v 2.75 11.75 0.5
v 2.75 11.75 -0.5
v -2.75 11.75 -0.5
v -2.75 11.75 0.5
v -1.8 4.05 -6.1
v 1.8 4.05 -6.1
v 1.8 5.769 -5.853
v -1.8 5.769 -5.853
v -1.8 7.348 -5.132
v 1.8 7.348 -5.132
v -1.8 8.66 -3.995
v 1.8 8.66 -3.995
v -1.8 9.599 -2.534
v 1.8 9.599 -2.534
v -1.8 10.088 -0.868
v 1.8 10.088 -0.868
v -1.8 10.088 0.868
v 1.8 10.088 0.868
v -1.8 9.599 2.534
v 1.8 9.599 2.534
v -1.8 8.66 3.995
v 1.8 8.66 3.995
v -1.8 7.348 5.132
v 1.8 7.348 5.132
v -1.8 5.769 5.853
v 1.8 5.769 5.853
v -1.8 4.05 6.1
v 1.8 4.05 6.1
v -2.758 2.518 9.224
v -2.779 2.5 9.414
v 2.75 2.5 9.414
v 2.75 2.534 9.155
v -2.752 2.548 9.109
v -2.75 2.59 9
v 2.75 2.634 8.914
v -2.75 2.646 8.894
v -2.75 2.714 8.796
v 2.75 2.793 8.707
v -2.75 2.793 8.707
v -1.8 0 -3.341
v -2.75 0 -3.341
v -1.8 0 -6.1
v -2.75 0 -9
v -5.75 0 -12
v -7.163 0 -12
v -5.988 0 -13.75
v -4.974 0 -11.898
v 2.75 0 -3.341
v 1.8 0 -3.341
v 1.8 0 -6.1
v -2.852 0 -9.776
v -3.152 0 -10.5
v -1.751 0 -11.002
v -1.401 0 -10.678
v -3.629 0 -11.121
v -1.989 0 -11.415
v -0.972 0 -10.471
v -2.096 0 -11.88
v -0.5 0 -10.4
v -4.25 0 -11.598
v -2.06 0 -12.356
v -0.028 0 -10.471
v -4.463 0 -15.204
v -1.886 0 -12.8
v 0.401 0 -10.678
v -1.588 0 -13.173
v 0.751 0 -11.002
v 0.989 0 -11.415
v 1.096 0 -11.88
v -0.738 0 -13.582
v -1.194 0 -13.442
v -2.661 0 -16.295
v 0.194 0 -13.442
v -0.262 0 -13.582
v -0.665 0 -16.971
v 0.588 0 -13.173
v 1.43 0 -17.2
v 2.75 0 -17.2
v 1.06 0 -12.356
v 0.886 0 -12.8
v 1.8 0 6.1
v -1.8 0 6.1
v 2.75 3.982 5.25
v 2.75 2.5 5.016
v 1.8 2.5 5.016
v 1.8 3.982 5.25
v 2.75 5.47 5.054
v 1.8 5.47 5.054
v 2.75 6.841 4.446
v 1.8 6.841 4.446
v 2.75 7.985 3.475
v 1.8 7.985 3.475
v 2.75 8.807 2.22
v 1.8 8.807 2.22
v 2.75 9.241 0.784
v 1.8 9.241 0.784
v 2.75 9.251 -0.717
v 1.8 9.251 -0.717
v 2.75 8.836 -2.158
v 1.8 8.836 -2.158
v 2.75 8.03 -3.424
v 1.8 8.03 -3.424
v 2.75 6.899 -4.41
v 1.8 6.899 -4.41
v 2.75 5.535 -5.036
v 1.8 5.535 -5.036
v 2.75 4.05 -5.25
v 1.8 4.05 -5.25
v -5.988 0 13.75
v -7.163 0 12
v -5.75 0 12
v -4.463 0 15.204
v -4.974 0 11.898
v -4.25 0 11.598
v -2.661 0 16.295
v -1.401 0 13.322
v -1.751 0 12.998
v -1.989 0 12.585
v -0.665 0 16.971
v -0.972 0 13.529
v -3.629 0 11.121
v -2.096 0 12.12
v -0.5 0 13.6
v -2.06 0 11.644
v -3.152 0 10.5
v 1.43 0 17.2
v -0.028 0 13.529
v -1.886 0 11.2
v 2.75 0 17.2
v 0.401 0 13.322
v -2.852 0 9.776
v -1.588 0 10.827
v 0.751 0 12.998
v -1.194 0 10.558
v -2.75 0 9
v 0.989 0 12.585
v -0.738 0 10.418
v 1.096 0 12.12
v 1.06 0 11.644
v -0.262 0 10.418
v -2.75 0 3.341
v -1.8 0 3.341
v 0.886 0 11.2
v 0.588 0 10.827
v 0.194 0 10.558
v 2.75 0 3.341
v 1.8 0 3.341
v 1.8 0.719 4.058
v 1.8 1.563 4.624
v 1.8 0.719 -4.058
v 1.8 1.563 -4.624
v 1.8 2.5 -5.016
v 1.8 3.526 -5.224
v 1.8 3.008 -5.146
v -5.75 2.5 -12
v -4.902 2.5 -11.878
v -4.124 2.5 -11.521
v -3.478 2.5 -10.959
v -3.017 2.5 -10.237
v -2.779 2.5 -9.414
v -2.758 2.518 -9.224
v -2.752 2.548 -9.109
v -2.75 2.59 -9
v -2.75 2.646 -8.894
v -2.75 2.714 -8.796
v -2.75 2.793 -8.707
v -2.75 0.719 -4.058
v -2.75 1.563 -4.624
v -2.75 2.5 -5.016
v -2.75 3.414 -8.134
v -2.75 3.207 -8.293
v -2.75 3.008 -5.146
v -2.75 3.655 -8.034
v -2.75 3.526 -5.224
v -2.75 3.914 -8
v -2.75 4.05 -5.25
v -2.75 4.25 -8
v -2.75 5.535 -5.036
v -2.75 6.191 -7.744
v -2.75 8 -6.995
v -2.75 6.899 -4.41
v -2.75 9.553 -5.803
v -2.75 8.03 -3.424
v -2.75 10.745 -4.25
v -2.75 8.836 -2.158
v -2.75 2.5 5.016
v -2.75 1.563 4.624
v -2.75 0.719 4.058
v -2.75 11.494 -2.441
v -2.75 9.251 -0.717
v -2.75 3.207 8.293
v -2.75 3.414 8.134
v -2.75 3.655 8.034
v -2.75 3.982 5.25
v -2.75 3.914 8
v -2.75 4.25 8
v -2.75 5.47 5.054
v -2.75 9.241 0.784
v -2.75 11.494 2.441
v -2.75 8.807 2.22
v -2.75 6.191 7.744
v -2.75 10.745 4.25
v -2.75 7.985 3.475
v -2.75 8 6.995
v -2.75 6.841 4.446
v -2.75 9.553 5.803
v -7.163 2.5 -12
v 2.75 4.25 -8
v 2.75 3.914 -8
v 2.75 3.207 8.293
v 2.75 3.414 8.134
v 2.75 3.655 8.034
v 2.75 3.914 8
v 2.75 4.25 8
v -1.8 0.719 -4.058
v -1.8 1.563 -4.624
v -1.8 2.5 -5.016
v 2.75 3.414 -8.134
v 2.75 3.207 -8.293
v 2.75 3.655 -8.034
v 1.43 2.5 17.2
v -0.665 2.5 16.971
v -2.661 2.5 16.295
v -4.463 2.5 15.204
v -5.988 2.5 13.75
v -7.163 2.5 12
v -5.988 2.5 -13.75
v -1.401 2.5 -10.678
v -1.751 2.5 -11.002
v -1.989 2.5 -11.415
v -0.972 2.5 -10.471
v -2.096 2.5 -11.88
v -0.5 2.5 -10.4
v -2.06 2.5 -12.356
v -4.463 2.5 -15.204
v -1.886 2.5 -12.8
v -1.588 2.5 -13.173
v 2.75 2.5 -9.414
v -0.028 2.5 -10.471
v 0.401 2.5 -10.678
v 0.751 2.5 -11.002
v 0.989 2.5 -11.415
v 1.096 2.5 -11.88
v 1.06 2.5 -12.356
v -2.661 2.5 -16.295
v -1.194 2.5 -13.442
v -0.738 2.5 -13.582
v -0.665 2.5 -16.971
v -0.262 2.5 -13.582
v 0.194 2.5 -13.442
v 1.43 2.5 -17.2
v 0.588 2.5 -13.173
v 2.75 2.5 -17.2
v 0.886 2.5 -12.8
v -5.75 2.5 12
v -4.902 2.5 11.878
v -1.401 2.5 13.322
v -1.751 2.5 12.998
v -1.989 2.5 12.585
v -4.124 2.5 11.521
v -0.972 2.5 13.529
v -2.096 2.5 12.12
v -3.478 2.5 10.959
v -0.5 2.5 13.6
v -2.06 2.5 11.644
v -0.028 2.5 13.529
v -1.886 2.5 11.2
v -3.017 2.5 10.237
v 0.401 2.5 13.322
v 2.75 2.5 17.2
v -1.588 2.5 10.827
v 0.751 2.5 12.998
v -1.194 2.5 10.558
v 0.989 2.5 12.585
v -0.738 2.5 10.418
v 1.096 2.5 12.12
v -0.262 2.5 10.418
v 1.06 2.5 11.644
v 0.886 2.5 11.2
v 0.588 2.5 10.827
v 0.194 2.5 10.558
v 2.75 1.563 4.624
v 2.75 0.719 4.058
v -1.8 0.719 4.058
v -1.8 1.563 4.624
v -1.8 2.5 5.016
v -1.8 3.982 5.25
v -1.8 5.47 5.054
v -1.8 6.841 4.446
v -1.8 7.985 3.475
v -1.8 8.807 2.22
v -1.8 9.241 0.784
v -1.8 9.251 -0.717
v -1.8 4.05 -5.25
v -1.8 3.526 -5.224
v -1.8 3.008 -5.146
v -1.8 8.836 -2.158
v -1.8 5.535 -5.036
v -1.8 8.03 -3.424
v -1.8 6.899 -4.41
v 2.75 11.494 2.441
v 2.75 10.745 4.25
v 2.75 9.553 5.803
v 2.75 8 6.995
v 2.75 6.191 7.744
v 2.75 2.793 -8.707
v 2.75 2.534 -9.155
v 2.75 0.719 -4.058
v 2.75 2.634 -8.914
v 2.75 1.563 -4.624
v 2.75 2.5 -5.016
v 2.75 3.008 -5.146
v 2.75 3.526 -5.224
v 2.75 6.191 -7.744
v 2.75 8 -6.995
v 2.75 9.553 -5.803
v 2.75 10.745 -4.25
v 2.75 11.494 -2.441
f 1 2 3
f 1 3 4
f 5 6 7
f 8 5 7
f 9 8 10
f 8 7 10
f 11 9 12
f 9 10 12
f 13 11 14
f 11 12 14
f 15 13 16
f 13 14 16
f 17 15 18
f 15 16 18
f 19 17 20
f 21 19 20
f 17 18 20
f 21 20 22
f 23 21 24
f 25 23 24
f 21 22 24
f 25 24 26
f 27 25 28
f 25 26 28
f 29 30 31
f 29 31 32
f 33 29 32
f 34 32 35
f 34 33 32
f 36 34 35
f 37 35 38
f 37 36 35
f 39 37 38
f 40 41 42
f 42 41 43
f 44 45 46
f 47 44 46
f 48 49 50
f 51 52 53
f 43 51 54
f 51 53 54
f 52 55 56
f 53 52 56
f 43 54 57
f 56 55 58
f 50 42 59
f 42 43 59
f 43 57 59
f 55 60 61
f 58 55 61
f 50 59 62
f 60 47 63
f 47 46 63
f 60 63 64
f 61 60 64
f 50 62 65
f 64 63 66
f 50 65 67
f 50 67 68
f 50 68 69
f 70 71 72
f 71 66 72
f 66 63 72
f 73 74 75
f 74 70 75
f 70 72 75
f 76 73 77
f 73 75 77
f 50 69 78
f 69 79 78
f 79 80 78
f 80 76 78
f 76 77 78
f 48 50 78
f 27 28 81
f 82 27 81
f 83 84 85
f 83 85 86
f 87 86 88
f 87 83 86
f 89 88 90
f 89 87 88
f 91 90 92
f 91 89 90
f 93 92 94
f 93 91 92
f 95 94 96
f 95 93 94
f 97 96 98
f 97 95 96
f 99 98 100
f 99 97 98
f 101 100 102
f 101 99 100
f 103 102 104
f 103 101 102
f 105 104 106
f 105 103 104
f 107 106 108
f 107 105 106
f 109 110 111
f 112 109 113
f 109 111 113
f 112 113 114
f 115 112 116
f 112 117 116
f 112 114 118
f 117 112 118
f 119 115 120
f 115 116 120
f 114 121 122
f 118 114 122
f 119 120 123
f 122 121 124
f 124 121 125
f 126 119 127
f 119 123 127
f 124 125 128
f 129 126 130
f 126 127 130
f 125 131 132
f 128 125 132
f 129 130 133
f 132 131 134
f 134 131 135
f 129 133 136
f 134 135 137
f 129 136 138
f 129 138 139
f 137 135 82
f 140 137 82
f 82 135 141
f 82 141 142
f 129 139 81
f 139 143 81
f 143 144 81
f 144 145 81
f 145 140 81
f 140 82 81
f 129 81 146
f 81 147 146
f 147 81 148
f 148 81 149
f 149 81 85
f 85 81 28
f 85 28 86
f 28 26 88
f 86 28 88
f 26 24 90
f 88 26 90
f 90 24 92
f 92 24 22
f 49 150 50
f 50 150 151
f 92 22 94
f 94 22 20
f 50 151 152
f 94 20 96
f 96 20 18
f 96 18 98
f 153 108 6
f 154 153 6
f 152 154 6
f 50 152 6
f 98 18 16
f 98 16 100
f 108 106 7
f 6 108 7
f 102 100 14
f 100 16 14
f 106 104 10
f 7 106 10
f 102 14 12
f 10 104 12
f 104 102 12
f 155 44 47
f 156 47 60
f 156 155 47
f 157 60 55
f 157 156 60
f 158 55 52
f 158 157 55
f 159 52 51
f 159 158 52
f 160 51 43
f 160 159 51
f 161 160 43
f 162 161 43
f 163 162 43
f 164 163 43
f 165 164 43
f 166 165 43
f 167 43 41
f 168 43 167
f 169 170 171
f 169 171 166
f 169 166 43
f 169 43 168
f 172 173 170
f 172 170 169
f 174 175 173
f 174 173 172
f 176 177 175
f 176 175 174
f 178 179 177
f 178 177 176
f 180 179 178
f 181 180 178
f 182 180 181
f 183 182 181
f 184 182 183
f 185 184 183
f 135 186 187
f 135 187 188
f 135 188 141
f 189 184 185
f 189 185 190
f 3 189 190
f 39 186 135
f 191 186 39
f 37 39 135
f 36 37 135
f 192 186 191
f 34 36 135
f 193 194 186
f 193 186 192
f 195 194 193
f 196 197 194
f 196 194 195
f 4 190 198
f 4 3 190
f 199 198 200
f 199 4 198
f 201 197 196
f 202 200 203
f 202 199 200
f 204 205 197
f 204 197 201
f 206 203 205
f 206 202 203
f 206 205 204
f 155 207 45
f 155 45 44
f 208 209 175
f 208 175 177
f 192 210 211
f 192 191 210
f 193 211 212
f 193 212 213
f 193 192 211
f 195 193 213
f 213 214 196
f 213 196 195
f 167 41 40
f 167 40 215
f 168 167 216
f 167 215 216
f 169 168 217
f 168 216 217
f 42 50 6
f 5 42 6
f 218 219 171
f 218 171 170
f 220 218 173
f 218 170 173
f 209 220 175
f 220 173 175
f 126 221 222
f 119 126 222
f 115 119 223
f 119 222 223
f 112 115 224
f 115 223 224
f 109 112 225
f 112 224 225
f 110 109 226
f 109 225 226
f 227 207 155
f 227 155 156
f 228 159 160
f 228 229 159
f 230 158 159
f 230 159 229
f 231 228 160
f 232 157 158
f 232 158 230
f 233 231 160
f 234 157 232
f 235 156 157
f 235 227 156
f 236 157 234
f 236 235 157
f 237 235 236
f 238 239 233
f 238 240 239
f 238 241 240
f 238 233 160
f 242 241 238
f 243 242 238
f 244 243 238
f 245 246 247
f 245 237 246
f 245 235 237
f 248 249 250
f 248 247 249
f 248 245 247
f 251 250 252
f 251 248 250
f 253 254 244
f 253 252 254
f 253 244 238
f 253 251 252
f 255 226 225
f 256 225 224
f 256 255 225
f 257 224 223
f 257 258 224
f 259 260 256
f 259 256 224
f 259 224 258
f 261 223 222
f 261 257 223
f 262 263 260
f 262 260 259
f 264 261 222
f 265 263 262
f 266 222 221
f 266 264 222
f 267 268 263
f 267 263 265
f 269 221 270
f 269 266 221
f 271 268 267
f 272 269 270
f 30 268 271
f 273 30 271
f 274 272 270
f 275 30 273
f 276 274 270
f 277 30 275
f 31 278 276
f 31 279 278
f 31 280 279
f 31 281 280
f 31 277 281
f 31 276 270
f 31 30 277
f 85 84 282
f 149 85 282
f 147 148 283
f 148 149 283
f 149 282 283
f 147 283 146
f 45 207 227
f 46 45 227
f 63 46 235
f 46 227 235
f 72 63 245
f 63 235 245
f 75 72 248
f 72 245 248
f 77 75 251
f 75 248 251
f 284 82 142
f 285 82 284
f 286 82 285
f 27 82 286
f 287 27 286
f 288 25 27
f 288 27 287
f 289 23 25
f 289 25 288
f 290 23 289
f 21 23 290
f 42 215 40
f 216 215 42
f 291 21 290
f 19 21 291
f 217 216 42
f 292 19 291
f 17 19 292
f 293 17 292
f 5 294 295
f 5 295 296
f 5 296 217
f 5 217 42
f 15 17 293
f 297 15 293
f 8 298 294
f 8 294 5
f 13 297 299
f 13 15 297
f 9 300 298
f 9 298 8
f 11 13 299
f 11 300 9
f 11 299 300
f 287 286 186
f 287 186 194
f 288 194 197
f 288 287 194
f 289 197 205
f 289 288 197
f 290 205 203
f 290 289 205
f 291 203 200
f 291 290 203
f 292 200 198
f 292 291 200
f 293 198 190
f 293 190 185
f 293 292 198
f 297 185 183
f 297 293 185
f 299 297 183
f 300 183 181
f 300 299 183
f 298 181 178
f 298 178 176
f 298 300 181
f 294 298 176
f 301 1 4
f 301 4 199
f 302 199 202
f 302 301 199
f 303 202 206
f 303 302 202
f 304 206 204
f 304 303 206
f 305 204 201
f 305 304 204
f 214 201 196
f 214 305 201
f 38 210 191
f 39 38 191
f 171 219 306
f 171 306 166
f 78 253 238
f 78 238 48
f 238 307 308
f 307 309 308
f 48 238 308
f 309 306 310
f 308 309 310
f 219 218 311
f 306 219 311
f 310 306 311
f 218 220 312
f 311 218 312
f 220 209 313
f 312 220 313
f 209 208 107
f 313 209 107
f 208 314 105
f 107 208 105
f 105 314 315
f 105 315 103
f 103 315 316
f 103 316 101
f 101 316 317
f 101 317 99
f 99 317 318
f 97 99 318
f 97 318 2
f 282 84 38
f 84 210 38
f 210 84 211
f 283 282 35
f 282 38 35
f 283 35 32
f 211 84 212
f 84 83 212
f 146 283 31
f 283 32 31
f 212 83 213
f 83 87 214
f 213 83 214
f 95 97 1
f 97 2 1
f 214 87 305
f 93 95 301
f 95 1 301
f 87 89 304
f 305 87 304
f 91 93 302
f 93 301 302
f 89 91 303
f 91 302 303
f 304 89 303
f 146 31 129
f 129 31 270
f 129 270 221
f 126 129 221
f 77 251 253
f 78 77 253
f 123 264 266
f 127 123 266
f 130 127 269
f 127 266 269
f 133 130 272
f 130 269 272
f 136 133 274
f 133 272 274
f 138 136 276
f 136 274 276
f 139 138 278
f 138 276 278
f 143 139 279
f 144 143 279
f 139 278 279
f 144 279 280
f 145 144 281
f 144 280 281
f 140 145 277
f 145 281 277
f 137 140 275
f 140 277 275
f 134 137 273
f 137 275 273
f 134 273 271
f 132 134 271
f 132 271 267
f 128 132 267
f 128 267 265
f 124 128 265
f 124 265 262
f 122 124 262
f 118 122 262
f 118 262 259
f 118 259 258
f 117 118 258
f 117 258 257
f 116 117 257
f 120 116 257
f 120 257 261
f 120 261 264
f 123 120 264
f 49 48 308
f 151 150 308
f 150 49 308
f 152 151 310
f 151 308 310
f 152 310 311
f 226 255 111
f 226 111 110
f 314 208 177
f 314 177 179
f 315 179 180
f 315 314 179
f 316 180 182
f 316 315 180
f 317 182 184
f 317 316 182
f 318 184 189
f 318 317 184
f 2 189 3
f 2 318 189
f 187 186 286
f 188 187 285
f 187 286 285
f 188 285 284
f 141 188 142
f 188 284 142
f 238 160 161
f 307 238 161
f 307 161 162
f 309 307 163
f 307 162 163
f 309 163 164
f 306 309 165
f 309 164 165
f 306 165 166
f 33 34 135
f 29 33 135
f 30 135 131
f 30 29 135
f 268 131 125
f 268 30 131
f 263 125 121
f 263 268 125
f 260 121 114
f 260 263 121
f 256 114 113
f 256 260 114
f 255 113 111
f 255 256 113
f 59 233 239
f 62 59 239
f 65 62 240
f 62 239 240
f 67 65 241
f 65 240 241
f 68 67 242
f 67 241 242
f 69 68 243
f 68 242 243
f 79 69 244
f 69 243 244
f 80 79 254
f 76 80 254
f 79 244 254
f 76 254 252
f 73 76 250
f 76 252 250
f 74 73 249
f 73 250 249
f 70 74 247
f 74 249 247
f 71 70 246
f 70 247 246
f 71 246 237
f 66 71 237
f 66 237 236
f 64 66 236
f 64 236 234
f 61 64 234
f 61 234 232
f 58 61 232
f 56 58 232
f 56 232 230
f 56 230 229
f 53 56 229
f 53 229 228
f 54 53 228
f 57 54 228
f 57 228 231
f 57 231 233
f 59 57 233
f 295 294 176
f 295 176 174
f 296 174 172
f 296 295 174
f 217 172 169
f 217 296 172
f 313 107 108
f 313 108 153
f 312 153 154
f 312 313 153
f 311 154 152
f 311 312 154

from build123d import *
from build123d.topology import SkipClean

# Parameters (mm, degrees)
SKETCH1_W               = 15
SKETCH1_H               = 35
BOSS_EXTRUDE1_DEPTH     = 2.5
CUT_EXTRUDE2_DEPTH      = 20.20286437
CUT_EXTRUDE2_DEPTH_BACK = 20.20286437
SKETCH3_W               = 4.75
SKETCH3_H               = 35
CUT_EXTRUDE3_DEPTH      = 20.20286437
FILLET1_R               = 10
CUT_EXTRUDE5_DEPTH      = 20.20286437
SKETCH7_R               = 1.6
CUT_EXTRUDE6_DEPTH      = 19.798797059
BOSS_EXTRUDE2_DEPTH     = 5.499997748
CUT_EXTRUDE7_START      = -0.95
CUT_EXTRUDE7_DEPTH      = 3.6
SKETCH11_R              = 5.25
CUT_EXTRUDE8_DEPTH      = 24.068697681
CHAMFER1_SIZE           = 1
FILLET2_R               = 1


with BuildPart() as part:
    # Sketch1 → Boss-Extrude1 (new body)
    with BuildSketch(Plane(origin=(0, 0, 0), x_dir=(1, 0, 0), z_dir=(0, 1, 0))):
        Rectangle(SKETCH1_W, SKETCH1_H)
    extrude(amount=BOSS_EXTRUDE1_DEPTH)

    # Sketch3 → Cut-Extrude2 (cut, two sides: drawn at the far end of the back side and taken through both)
    with BuildSketch(Plane.XZ.offset(-CUT_EXTRUDE2_DEPTH_BACK)):
        with Locations((5.125, 0)):
            Rectangle(SKETCH3_W, SKETCH3_H)
    extrude(amount=CUT_EXTRUDE2_DEPTH + CUT_EXTRUDE2_DEPTH_BACK, mode=Mode.SUBTRACT)

    # Sketch5 → Cut-Extrude3 (cut, through all)
    with BuildSketch(Plane(origin=(0, 2.5, 0), x_dir=(1, 0, 0), z_dir=(0, 1, 0))):
        with BuildLine():
            Line((-5.749997748, -12), (-10.249997748, -12))
            ThreePointArc((-10.249997748, -12), (-12.371318091, -11.121320344), (-13.249997748, -9))
            Line((-13.249997748, -9), (-13.249997748, 9))
            ThreePointArc((-13.249997748, 9), (-12.371318091, 11.121320344), (-10.249997748, 12))
            Line((-10.249997748, 12), (-5.749997748, 12))
            ThreePointArc((-5.749997748, 12), (-3.628677404, 11.121320344), (-2.749997748, 9))
            Line((-2.749997748, 9), (-2.749997748, -9))
            ThreePointArc((-2.749997748, -9), (-3.628677404, -11.121320344), (-5.749997748, -12))
        make_face()
    extrude(amount=-CUT_EXTRUDE3_DEPTH, mode=Mode.SUBTRACT)

    # Fillet1
    # the kernel refuses this fillet: 10 mm, written as the material it takes off along each edge
    with BuildSketch(Plane(origin=(-7.5, -22.325713874, 17.5), x_dir=(1, 0, 0), z_dir=(0, 1, 0))) as fillet1_piece_1:
        with BuildLine():
            CenterArc((8.93028555, 10), FILLET1_R, 206.74368395, 63.25631605)
            Line((0, 5.5), (-0.178605711, 5.41))
            ThreePointArc((-0.178605711, 5.41), (-0.2, 2.75), (-0.2, 0))
            Line((-0.2, 0), (0, -0.2))
            Line((0, -0.2), (8.93028555, -0.2))
            Line((8.93028555, -0.2), (8.93028555, 0))
        make_face()
    extrude(amount=47.151427749, mode=Mode.SUBTRACT)
    with BuildSketch(Plane(origin=(-7.5, -22.325713874, -17.5), x_dir=(1, 0, 0), z_dir=(0, 1, 0))) as fillet1_piece_2:
        with BuildLine():
            CenterArc((8.93028555, -10), FILLET1_R, 90, 63.25631605)
            Line((0, -5.5), (-0.178605711, -5.41))
            ThreePointArc((-0.178605711, -5.41), (-0.2, -2.75), (-0.2, 0))
            Line((-0.2, 0), (0, 0.2))
            Line((0, 0.2), (8.93028555, 0.2))
            Line((8.93028555, 0.2), (8.93028555, 0))
        make_face()
    extrude(amount=47.151427749, mode=Mode.SUBTRACT)

    # Sketch6 → Cut-Extrude5 (cut, through all)
    with BuildSketch(Plane(origin=(0, 2.5, 0), x_dir=(1, 0, 0), z_dir=(0, 1, 0))):
        with BuildLine():
            Line((1.43028555, 17.2), (2.75, 17.2))
            Line((2.75, 17.2), (2.75, 17.5))
            Line((2.75, 17.5), (1.43028555, 17.5))
            ThreePointArc((1.43028555, 17.5), (-3.813758691, 16.014693183), (-7.5, 12))
            Line((-7.5, 12), (-7.162734874, 12))
            ThreePointArc((-7.162734874, 12), (-3.591666262, 15.798795093), (1.43028555, 17.2))
        make_face()
        with BuildLine():
            Line((2.75, -17.5), (2.75, -17.2))
            Line((2.75, -17.2), (1.43028555, -17.2))
            ThreePointArc((1.43028555, -17.2), (-3.591666262, -15.798795093), (-7.162734874, -12))
            Line((-7.162734874, -12), (-7.5, -12))
            ThreePointArc((-7.5, -12), (-3.813758691, -16.014693183), (1.43028555, -17.5))
            Line((1.43028555, -17.5), (2.75, -17.5))
        make_face()
    extrude(amount=-CUT_EXTRUDE5_DEPTH, mode=Mode.SUBTRACT)

    # Sketch7 → Cut-Extrude6 (cut, through all)
    with BuildSketch(Plane(origin=(0, 2.5, 0), x_dir=(1, 0, 0), z_dir=(0, 1, 0))):
        with Locations(Location((-0.5, 12, 0), (0, 0, 270))):
            Circle(SKETCH7_R)
        with Locations(Location((-0.5, -12, 0), (0, 0, 270))):
            Circle(SKETCH7_R)
    extrude(amount=-CUT_EXTRUDE6_DEPTH, mode=Mode.SUBTRACT)

    # Sketch9 → Boss-Extrude2 (add)
    with BuildSketch(Plane(origin=(2.75, 0, 0), x_dir=(0, 0, -1), z_dir=(1, 0, 0))):
        with BuildLine():
            Line((-8, 2.5), (-5.015974482, 2.5))
            ThreePointArc((-5.015974482, 2.5), (-0.783783762, 9.241163936), (5.25, 4.05))
            ThreePointArc((5.25, 4.05), (5.191163936, 3.266216238), (5.015974482, 2.5))
            Line((5.015974482, 2.5), (8, 2.5))
            Line((8, 2.5), (8, 4.25))
            ThreePointArc((8, 4.25), (5.803300859, 9.553300859), (0.5, 11.75))
            Line((0.5, 11.75), (-0.5, 11.75))
            ThreePointArc((-0.5, 11.75), (-5.803300859, 9.553300859), (-8, 4.25))
            Line((-8, 4.25), (-8, 2.5))
        make_face()
    extrude(amount=-BOSS_EXTRUDE2_DEPTH)

    # Sketch10 → Cut-Extrude7 (cut)
    with BuildSketch(Plane(origin=(2.75, 0, 0), x_dir=(0, 0, -1), z_dir=(1, 0, 0)).offset(CUT_EXTRUDE7_START)):
        with BuildLine():
            ThreePointArc((6.1, 4.05), (0, 10.15), (-6.1, 4.05))
            ThreePointArc((-6.1, 4.05), (-5.70242473, 1.883816212), (-4.561523868, 0))
            Line((-4.561523868, 0), (-3.340658618, 0))
            ThreePointArc((-3.340658618, 0), (-4.361287561, 1.127386305), (-5.015974482, 2.5))
            ThreePointArc((-5.015974482, 2.5), (-0.783783762, 9.241163936), (5.25, 4.05))
            ThreePointArc((5.25, 4.05), (5.191163936, 3.266216238), (5.015974482, 2.5))
            ThreePointArc((5.015974482, 2.5), (4.361287561, 1.127386305), (3.340658618, 0))
            Line((3.340658618, 0), (4.561523868, 0))
            ThreePointArc((4.561523868, 0), (5.70242473, 1.883816212), (6.1, 4.05))
        make_face()
        with BuildLine():
            ThreePointArc((-4.561523868, 0), (-5.70242473, 1.883816212), (-6.1, 4.05))
            Line((-6.1, 4.05), (-6.1, 0))
            Line((-6.1, 0), (-4.561523868, 0))
        make_face()
        with BuildLine():
            Line((6.1, 0), (6.1, 4.05))
            ThreePointArc((6.1, 4.05), (5.70242473, 1.883816212), (4.561523868, 0))
            Line((4.561523868, 0), (6.1, 0))
        make_face()
    extrude(amount=-CUT_EXTRUDE7_DEPTH, mode=Mode.SUBTRACT)

    # Sketch11 → Cut-Extrude8 (cut, through all)
    with SkipClean():  # the faces are left unmerged after this step: merging them gives an invalid solid
        with BuildSketch(Plane(origin=(2.75, 0, 0), x_dir=(0, 0, -1), z_dir=(1, 0, 0))):
            with Locations((0, 4.05)):
                Circle(SKETCH11_R)
        extrude(amount=-CUT_EXTRUDE8_DEPTH, mode=Mode.SUBTRACT)

    # Chamfer1
    chamfer1_edges = [part.edges().sort_by_distance(p)[0] for p in [
        (1.126e-06, 2.5, 8),
        (1.126e-06, 2.5, -8),
    ]]
    chamfer(chamfer1_edges, length=CHAMFER1_SIZE)

    # Fillet2
    fillet2_edges = [part.edges().sort_by_distance(p)[0] for p in [
        (1.126e-06, 3.5, 8),
        (1.126e-06, 2.5, 9),
        (1.126e-06, 2.5, -9),
        (1.126e-06, 3.5, -8),
    ]]
    fillet(fillet2_edges, radius=FILLET2_R)


solid = part.part
